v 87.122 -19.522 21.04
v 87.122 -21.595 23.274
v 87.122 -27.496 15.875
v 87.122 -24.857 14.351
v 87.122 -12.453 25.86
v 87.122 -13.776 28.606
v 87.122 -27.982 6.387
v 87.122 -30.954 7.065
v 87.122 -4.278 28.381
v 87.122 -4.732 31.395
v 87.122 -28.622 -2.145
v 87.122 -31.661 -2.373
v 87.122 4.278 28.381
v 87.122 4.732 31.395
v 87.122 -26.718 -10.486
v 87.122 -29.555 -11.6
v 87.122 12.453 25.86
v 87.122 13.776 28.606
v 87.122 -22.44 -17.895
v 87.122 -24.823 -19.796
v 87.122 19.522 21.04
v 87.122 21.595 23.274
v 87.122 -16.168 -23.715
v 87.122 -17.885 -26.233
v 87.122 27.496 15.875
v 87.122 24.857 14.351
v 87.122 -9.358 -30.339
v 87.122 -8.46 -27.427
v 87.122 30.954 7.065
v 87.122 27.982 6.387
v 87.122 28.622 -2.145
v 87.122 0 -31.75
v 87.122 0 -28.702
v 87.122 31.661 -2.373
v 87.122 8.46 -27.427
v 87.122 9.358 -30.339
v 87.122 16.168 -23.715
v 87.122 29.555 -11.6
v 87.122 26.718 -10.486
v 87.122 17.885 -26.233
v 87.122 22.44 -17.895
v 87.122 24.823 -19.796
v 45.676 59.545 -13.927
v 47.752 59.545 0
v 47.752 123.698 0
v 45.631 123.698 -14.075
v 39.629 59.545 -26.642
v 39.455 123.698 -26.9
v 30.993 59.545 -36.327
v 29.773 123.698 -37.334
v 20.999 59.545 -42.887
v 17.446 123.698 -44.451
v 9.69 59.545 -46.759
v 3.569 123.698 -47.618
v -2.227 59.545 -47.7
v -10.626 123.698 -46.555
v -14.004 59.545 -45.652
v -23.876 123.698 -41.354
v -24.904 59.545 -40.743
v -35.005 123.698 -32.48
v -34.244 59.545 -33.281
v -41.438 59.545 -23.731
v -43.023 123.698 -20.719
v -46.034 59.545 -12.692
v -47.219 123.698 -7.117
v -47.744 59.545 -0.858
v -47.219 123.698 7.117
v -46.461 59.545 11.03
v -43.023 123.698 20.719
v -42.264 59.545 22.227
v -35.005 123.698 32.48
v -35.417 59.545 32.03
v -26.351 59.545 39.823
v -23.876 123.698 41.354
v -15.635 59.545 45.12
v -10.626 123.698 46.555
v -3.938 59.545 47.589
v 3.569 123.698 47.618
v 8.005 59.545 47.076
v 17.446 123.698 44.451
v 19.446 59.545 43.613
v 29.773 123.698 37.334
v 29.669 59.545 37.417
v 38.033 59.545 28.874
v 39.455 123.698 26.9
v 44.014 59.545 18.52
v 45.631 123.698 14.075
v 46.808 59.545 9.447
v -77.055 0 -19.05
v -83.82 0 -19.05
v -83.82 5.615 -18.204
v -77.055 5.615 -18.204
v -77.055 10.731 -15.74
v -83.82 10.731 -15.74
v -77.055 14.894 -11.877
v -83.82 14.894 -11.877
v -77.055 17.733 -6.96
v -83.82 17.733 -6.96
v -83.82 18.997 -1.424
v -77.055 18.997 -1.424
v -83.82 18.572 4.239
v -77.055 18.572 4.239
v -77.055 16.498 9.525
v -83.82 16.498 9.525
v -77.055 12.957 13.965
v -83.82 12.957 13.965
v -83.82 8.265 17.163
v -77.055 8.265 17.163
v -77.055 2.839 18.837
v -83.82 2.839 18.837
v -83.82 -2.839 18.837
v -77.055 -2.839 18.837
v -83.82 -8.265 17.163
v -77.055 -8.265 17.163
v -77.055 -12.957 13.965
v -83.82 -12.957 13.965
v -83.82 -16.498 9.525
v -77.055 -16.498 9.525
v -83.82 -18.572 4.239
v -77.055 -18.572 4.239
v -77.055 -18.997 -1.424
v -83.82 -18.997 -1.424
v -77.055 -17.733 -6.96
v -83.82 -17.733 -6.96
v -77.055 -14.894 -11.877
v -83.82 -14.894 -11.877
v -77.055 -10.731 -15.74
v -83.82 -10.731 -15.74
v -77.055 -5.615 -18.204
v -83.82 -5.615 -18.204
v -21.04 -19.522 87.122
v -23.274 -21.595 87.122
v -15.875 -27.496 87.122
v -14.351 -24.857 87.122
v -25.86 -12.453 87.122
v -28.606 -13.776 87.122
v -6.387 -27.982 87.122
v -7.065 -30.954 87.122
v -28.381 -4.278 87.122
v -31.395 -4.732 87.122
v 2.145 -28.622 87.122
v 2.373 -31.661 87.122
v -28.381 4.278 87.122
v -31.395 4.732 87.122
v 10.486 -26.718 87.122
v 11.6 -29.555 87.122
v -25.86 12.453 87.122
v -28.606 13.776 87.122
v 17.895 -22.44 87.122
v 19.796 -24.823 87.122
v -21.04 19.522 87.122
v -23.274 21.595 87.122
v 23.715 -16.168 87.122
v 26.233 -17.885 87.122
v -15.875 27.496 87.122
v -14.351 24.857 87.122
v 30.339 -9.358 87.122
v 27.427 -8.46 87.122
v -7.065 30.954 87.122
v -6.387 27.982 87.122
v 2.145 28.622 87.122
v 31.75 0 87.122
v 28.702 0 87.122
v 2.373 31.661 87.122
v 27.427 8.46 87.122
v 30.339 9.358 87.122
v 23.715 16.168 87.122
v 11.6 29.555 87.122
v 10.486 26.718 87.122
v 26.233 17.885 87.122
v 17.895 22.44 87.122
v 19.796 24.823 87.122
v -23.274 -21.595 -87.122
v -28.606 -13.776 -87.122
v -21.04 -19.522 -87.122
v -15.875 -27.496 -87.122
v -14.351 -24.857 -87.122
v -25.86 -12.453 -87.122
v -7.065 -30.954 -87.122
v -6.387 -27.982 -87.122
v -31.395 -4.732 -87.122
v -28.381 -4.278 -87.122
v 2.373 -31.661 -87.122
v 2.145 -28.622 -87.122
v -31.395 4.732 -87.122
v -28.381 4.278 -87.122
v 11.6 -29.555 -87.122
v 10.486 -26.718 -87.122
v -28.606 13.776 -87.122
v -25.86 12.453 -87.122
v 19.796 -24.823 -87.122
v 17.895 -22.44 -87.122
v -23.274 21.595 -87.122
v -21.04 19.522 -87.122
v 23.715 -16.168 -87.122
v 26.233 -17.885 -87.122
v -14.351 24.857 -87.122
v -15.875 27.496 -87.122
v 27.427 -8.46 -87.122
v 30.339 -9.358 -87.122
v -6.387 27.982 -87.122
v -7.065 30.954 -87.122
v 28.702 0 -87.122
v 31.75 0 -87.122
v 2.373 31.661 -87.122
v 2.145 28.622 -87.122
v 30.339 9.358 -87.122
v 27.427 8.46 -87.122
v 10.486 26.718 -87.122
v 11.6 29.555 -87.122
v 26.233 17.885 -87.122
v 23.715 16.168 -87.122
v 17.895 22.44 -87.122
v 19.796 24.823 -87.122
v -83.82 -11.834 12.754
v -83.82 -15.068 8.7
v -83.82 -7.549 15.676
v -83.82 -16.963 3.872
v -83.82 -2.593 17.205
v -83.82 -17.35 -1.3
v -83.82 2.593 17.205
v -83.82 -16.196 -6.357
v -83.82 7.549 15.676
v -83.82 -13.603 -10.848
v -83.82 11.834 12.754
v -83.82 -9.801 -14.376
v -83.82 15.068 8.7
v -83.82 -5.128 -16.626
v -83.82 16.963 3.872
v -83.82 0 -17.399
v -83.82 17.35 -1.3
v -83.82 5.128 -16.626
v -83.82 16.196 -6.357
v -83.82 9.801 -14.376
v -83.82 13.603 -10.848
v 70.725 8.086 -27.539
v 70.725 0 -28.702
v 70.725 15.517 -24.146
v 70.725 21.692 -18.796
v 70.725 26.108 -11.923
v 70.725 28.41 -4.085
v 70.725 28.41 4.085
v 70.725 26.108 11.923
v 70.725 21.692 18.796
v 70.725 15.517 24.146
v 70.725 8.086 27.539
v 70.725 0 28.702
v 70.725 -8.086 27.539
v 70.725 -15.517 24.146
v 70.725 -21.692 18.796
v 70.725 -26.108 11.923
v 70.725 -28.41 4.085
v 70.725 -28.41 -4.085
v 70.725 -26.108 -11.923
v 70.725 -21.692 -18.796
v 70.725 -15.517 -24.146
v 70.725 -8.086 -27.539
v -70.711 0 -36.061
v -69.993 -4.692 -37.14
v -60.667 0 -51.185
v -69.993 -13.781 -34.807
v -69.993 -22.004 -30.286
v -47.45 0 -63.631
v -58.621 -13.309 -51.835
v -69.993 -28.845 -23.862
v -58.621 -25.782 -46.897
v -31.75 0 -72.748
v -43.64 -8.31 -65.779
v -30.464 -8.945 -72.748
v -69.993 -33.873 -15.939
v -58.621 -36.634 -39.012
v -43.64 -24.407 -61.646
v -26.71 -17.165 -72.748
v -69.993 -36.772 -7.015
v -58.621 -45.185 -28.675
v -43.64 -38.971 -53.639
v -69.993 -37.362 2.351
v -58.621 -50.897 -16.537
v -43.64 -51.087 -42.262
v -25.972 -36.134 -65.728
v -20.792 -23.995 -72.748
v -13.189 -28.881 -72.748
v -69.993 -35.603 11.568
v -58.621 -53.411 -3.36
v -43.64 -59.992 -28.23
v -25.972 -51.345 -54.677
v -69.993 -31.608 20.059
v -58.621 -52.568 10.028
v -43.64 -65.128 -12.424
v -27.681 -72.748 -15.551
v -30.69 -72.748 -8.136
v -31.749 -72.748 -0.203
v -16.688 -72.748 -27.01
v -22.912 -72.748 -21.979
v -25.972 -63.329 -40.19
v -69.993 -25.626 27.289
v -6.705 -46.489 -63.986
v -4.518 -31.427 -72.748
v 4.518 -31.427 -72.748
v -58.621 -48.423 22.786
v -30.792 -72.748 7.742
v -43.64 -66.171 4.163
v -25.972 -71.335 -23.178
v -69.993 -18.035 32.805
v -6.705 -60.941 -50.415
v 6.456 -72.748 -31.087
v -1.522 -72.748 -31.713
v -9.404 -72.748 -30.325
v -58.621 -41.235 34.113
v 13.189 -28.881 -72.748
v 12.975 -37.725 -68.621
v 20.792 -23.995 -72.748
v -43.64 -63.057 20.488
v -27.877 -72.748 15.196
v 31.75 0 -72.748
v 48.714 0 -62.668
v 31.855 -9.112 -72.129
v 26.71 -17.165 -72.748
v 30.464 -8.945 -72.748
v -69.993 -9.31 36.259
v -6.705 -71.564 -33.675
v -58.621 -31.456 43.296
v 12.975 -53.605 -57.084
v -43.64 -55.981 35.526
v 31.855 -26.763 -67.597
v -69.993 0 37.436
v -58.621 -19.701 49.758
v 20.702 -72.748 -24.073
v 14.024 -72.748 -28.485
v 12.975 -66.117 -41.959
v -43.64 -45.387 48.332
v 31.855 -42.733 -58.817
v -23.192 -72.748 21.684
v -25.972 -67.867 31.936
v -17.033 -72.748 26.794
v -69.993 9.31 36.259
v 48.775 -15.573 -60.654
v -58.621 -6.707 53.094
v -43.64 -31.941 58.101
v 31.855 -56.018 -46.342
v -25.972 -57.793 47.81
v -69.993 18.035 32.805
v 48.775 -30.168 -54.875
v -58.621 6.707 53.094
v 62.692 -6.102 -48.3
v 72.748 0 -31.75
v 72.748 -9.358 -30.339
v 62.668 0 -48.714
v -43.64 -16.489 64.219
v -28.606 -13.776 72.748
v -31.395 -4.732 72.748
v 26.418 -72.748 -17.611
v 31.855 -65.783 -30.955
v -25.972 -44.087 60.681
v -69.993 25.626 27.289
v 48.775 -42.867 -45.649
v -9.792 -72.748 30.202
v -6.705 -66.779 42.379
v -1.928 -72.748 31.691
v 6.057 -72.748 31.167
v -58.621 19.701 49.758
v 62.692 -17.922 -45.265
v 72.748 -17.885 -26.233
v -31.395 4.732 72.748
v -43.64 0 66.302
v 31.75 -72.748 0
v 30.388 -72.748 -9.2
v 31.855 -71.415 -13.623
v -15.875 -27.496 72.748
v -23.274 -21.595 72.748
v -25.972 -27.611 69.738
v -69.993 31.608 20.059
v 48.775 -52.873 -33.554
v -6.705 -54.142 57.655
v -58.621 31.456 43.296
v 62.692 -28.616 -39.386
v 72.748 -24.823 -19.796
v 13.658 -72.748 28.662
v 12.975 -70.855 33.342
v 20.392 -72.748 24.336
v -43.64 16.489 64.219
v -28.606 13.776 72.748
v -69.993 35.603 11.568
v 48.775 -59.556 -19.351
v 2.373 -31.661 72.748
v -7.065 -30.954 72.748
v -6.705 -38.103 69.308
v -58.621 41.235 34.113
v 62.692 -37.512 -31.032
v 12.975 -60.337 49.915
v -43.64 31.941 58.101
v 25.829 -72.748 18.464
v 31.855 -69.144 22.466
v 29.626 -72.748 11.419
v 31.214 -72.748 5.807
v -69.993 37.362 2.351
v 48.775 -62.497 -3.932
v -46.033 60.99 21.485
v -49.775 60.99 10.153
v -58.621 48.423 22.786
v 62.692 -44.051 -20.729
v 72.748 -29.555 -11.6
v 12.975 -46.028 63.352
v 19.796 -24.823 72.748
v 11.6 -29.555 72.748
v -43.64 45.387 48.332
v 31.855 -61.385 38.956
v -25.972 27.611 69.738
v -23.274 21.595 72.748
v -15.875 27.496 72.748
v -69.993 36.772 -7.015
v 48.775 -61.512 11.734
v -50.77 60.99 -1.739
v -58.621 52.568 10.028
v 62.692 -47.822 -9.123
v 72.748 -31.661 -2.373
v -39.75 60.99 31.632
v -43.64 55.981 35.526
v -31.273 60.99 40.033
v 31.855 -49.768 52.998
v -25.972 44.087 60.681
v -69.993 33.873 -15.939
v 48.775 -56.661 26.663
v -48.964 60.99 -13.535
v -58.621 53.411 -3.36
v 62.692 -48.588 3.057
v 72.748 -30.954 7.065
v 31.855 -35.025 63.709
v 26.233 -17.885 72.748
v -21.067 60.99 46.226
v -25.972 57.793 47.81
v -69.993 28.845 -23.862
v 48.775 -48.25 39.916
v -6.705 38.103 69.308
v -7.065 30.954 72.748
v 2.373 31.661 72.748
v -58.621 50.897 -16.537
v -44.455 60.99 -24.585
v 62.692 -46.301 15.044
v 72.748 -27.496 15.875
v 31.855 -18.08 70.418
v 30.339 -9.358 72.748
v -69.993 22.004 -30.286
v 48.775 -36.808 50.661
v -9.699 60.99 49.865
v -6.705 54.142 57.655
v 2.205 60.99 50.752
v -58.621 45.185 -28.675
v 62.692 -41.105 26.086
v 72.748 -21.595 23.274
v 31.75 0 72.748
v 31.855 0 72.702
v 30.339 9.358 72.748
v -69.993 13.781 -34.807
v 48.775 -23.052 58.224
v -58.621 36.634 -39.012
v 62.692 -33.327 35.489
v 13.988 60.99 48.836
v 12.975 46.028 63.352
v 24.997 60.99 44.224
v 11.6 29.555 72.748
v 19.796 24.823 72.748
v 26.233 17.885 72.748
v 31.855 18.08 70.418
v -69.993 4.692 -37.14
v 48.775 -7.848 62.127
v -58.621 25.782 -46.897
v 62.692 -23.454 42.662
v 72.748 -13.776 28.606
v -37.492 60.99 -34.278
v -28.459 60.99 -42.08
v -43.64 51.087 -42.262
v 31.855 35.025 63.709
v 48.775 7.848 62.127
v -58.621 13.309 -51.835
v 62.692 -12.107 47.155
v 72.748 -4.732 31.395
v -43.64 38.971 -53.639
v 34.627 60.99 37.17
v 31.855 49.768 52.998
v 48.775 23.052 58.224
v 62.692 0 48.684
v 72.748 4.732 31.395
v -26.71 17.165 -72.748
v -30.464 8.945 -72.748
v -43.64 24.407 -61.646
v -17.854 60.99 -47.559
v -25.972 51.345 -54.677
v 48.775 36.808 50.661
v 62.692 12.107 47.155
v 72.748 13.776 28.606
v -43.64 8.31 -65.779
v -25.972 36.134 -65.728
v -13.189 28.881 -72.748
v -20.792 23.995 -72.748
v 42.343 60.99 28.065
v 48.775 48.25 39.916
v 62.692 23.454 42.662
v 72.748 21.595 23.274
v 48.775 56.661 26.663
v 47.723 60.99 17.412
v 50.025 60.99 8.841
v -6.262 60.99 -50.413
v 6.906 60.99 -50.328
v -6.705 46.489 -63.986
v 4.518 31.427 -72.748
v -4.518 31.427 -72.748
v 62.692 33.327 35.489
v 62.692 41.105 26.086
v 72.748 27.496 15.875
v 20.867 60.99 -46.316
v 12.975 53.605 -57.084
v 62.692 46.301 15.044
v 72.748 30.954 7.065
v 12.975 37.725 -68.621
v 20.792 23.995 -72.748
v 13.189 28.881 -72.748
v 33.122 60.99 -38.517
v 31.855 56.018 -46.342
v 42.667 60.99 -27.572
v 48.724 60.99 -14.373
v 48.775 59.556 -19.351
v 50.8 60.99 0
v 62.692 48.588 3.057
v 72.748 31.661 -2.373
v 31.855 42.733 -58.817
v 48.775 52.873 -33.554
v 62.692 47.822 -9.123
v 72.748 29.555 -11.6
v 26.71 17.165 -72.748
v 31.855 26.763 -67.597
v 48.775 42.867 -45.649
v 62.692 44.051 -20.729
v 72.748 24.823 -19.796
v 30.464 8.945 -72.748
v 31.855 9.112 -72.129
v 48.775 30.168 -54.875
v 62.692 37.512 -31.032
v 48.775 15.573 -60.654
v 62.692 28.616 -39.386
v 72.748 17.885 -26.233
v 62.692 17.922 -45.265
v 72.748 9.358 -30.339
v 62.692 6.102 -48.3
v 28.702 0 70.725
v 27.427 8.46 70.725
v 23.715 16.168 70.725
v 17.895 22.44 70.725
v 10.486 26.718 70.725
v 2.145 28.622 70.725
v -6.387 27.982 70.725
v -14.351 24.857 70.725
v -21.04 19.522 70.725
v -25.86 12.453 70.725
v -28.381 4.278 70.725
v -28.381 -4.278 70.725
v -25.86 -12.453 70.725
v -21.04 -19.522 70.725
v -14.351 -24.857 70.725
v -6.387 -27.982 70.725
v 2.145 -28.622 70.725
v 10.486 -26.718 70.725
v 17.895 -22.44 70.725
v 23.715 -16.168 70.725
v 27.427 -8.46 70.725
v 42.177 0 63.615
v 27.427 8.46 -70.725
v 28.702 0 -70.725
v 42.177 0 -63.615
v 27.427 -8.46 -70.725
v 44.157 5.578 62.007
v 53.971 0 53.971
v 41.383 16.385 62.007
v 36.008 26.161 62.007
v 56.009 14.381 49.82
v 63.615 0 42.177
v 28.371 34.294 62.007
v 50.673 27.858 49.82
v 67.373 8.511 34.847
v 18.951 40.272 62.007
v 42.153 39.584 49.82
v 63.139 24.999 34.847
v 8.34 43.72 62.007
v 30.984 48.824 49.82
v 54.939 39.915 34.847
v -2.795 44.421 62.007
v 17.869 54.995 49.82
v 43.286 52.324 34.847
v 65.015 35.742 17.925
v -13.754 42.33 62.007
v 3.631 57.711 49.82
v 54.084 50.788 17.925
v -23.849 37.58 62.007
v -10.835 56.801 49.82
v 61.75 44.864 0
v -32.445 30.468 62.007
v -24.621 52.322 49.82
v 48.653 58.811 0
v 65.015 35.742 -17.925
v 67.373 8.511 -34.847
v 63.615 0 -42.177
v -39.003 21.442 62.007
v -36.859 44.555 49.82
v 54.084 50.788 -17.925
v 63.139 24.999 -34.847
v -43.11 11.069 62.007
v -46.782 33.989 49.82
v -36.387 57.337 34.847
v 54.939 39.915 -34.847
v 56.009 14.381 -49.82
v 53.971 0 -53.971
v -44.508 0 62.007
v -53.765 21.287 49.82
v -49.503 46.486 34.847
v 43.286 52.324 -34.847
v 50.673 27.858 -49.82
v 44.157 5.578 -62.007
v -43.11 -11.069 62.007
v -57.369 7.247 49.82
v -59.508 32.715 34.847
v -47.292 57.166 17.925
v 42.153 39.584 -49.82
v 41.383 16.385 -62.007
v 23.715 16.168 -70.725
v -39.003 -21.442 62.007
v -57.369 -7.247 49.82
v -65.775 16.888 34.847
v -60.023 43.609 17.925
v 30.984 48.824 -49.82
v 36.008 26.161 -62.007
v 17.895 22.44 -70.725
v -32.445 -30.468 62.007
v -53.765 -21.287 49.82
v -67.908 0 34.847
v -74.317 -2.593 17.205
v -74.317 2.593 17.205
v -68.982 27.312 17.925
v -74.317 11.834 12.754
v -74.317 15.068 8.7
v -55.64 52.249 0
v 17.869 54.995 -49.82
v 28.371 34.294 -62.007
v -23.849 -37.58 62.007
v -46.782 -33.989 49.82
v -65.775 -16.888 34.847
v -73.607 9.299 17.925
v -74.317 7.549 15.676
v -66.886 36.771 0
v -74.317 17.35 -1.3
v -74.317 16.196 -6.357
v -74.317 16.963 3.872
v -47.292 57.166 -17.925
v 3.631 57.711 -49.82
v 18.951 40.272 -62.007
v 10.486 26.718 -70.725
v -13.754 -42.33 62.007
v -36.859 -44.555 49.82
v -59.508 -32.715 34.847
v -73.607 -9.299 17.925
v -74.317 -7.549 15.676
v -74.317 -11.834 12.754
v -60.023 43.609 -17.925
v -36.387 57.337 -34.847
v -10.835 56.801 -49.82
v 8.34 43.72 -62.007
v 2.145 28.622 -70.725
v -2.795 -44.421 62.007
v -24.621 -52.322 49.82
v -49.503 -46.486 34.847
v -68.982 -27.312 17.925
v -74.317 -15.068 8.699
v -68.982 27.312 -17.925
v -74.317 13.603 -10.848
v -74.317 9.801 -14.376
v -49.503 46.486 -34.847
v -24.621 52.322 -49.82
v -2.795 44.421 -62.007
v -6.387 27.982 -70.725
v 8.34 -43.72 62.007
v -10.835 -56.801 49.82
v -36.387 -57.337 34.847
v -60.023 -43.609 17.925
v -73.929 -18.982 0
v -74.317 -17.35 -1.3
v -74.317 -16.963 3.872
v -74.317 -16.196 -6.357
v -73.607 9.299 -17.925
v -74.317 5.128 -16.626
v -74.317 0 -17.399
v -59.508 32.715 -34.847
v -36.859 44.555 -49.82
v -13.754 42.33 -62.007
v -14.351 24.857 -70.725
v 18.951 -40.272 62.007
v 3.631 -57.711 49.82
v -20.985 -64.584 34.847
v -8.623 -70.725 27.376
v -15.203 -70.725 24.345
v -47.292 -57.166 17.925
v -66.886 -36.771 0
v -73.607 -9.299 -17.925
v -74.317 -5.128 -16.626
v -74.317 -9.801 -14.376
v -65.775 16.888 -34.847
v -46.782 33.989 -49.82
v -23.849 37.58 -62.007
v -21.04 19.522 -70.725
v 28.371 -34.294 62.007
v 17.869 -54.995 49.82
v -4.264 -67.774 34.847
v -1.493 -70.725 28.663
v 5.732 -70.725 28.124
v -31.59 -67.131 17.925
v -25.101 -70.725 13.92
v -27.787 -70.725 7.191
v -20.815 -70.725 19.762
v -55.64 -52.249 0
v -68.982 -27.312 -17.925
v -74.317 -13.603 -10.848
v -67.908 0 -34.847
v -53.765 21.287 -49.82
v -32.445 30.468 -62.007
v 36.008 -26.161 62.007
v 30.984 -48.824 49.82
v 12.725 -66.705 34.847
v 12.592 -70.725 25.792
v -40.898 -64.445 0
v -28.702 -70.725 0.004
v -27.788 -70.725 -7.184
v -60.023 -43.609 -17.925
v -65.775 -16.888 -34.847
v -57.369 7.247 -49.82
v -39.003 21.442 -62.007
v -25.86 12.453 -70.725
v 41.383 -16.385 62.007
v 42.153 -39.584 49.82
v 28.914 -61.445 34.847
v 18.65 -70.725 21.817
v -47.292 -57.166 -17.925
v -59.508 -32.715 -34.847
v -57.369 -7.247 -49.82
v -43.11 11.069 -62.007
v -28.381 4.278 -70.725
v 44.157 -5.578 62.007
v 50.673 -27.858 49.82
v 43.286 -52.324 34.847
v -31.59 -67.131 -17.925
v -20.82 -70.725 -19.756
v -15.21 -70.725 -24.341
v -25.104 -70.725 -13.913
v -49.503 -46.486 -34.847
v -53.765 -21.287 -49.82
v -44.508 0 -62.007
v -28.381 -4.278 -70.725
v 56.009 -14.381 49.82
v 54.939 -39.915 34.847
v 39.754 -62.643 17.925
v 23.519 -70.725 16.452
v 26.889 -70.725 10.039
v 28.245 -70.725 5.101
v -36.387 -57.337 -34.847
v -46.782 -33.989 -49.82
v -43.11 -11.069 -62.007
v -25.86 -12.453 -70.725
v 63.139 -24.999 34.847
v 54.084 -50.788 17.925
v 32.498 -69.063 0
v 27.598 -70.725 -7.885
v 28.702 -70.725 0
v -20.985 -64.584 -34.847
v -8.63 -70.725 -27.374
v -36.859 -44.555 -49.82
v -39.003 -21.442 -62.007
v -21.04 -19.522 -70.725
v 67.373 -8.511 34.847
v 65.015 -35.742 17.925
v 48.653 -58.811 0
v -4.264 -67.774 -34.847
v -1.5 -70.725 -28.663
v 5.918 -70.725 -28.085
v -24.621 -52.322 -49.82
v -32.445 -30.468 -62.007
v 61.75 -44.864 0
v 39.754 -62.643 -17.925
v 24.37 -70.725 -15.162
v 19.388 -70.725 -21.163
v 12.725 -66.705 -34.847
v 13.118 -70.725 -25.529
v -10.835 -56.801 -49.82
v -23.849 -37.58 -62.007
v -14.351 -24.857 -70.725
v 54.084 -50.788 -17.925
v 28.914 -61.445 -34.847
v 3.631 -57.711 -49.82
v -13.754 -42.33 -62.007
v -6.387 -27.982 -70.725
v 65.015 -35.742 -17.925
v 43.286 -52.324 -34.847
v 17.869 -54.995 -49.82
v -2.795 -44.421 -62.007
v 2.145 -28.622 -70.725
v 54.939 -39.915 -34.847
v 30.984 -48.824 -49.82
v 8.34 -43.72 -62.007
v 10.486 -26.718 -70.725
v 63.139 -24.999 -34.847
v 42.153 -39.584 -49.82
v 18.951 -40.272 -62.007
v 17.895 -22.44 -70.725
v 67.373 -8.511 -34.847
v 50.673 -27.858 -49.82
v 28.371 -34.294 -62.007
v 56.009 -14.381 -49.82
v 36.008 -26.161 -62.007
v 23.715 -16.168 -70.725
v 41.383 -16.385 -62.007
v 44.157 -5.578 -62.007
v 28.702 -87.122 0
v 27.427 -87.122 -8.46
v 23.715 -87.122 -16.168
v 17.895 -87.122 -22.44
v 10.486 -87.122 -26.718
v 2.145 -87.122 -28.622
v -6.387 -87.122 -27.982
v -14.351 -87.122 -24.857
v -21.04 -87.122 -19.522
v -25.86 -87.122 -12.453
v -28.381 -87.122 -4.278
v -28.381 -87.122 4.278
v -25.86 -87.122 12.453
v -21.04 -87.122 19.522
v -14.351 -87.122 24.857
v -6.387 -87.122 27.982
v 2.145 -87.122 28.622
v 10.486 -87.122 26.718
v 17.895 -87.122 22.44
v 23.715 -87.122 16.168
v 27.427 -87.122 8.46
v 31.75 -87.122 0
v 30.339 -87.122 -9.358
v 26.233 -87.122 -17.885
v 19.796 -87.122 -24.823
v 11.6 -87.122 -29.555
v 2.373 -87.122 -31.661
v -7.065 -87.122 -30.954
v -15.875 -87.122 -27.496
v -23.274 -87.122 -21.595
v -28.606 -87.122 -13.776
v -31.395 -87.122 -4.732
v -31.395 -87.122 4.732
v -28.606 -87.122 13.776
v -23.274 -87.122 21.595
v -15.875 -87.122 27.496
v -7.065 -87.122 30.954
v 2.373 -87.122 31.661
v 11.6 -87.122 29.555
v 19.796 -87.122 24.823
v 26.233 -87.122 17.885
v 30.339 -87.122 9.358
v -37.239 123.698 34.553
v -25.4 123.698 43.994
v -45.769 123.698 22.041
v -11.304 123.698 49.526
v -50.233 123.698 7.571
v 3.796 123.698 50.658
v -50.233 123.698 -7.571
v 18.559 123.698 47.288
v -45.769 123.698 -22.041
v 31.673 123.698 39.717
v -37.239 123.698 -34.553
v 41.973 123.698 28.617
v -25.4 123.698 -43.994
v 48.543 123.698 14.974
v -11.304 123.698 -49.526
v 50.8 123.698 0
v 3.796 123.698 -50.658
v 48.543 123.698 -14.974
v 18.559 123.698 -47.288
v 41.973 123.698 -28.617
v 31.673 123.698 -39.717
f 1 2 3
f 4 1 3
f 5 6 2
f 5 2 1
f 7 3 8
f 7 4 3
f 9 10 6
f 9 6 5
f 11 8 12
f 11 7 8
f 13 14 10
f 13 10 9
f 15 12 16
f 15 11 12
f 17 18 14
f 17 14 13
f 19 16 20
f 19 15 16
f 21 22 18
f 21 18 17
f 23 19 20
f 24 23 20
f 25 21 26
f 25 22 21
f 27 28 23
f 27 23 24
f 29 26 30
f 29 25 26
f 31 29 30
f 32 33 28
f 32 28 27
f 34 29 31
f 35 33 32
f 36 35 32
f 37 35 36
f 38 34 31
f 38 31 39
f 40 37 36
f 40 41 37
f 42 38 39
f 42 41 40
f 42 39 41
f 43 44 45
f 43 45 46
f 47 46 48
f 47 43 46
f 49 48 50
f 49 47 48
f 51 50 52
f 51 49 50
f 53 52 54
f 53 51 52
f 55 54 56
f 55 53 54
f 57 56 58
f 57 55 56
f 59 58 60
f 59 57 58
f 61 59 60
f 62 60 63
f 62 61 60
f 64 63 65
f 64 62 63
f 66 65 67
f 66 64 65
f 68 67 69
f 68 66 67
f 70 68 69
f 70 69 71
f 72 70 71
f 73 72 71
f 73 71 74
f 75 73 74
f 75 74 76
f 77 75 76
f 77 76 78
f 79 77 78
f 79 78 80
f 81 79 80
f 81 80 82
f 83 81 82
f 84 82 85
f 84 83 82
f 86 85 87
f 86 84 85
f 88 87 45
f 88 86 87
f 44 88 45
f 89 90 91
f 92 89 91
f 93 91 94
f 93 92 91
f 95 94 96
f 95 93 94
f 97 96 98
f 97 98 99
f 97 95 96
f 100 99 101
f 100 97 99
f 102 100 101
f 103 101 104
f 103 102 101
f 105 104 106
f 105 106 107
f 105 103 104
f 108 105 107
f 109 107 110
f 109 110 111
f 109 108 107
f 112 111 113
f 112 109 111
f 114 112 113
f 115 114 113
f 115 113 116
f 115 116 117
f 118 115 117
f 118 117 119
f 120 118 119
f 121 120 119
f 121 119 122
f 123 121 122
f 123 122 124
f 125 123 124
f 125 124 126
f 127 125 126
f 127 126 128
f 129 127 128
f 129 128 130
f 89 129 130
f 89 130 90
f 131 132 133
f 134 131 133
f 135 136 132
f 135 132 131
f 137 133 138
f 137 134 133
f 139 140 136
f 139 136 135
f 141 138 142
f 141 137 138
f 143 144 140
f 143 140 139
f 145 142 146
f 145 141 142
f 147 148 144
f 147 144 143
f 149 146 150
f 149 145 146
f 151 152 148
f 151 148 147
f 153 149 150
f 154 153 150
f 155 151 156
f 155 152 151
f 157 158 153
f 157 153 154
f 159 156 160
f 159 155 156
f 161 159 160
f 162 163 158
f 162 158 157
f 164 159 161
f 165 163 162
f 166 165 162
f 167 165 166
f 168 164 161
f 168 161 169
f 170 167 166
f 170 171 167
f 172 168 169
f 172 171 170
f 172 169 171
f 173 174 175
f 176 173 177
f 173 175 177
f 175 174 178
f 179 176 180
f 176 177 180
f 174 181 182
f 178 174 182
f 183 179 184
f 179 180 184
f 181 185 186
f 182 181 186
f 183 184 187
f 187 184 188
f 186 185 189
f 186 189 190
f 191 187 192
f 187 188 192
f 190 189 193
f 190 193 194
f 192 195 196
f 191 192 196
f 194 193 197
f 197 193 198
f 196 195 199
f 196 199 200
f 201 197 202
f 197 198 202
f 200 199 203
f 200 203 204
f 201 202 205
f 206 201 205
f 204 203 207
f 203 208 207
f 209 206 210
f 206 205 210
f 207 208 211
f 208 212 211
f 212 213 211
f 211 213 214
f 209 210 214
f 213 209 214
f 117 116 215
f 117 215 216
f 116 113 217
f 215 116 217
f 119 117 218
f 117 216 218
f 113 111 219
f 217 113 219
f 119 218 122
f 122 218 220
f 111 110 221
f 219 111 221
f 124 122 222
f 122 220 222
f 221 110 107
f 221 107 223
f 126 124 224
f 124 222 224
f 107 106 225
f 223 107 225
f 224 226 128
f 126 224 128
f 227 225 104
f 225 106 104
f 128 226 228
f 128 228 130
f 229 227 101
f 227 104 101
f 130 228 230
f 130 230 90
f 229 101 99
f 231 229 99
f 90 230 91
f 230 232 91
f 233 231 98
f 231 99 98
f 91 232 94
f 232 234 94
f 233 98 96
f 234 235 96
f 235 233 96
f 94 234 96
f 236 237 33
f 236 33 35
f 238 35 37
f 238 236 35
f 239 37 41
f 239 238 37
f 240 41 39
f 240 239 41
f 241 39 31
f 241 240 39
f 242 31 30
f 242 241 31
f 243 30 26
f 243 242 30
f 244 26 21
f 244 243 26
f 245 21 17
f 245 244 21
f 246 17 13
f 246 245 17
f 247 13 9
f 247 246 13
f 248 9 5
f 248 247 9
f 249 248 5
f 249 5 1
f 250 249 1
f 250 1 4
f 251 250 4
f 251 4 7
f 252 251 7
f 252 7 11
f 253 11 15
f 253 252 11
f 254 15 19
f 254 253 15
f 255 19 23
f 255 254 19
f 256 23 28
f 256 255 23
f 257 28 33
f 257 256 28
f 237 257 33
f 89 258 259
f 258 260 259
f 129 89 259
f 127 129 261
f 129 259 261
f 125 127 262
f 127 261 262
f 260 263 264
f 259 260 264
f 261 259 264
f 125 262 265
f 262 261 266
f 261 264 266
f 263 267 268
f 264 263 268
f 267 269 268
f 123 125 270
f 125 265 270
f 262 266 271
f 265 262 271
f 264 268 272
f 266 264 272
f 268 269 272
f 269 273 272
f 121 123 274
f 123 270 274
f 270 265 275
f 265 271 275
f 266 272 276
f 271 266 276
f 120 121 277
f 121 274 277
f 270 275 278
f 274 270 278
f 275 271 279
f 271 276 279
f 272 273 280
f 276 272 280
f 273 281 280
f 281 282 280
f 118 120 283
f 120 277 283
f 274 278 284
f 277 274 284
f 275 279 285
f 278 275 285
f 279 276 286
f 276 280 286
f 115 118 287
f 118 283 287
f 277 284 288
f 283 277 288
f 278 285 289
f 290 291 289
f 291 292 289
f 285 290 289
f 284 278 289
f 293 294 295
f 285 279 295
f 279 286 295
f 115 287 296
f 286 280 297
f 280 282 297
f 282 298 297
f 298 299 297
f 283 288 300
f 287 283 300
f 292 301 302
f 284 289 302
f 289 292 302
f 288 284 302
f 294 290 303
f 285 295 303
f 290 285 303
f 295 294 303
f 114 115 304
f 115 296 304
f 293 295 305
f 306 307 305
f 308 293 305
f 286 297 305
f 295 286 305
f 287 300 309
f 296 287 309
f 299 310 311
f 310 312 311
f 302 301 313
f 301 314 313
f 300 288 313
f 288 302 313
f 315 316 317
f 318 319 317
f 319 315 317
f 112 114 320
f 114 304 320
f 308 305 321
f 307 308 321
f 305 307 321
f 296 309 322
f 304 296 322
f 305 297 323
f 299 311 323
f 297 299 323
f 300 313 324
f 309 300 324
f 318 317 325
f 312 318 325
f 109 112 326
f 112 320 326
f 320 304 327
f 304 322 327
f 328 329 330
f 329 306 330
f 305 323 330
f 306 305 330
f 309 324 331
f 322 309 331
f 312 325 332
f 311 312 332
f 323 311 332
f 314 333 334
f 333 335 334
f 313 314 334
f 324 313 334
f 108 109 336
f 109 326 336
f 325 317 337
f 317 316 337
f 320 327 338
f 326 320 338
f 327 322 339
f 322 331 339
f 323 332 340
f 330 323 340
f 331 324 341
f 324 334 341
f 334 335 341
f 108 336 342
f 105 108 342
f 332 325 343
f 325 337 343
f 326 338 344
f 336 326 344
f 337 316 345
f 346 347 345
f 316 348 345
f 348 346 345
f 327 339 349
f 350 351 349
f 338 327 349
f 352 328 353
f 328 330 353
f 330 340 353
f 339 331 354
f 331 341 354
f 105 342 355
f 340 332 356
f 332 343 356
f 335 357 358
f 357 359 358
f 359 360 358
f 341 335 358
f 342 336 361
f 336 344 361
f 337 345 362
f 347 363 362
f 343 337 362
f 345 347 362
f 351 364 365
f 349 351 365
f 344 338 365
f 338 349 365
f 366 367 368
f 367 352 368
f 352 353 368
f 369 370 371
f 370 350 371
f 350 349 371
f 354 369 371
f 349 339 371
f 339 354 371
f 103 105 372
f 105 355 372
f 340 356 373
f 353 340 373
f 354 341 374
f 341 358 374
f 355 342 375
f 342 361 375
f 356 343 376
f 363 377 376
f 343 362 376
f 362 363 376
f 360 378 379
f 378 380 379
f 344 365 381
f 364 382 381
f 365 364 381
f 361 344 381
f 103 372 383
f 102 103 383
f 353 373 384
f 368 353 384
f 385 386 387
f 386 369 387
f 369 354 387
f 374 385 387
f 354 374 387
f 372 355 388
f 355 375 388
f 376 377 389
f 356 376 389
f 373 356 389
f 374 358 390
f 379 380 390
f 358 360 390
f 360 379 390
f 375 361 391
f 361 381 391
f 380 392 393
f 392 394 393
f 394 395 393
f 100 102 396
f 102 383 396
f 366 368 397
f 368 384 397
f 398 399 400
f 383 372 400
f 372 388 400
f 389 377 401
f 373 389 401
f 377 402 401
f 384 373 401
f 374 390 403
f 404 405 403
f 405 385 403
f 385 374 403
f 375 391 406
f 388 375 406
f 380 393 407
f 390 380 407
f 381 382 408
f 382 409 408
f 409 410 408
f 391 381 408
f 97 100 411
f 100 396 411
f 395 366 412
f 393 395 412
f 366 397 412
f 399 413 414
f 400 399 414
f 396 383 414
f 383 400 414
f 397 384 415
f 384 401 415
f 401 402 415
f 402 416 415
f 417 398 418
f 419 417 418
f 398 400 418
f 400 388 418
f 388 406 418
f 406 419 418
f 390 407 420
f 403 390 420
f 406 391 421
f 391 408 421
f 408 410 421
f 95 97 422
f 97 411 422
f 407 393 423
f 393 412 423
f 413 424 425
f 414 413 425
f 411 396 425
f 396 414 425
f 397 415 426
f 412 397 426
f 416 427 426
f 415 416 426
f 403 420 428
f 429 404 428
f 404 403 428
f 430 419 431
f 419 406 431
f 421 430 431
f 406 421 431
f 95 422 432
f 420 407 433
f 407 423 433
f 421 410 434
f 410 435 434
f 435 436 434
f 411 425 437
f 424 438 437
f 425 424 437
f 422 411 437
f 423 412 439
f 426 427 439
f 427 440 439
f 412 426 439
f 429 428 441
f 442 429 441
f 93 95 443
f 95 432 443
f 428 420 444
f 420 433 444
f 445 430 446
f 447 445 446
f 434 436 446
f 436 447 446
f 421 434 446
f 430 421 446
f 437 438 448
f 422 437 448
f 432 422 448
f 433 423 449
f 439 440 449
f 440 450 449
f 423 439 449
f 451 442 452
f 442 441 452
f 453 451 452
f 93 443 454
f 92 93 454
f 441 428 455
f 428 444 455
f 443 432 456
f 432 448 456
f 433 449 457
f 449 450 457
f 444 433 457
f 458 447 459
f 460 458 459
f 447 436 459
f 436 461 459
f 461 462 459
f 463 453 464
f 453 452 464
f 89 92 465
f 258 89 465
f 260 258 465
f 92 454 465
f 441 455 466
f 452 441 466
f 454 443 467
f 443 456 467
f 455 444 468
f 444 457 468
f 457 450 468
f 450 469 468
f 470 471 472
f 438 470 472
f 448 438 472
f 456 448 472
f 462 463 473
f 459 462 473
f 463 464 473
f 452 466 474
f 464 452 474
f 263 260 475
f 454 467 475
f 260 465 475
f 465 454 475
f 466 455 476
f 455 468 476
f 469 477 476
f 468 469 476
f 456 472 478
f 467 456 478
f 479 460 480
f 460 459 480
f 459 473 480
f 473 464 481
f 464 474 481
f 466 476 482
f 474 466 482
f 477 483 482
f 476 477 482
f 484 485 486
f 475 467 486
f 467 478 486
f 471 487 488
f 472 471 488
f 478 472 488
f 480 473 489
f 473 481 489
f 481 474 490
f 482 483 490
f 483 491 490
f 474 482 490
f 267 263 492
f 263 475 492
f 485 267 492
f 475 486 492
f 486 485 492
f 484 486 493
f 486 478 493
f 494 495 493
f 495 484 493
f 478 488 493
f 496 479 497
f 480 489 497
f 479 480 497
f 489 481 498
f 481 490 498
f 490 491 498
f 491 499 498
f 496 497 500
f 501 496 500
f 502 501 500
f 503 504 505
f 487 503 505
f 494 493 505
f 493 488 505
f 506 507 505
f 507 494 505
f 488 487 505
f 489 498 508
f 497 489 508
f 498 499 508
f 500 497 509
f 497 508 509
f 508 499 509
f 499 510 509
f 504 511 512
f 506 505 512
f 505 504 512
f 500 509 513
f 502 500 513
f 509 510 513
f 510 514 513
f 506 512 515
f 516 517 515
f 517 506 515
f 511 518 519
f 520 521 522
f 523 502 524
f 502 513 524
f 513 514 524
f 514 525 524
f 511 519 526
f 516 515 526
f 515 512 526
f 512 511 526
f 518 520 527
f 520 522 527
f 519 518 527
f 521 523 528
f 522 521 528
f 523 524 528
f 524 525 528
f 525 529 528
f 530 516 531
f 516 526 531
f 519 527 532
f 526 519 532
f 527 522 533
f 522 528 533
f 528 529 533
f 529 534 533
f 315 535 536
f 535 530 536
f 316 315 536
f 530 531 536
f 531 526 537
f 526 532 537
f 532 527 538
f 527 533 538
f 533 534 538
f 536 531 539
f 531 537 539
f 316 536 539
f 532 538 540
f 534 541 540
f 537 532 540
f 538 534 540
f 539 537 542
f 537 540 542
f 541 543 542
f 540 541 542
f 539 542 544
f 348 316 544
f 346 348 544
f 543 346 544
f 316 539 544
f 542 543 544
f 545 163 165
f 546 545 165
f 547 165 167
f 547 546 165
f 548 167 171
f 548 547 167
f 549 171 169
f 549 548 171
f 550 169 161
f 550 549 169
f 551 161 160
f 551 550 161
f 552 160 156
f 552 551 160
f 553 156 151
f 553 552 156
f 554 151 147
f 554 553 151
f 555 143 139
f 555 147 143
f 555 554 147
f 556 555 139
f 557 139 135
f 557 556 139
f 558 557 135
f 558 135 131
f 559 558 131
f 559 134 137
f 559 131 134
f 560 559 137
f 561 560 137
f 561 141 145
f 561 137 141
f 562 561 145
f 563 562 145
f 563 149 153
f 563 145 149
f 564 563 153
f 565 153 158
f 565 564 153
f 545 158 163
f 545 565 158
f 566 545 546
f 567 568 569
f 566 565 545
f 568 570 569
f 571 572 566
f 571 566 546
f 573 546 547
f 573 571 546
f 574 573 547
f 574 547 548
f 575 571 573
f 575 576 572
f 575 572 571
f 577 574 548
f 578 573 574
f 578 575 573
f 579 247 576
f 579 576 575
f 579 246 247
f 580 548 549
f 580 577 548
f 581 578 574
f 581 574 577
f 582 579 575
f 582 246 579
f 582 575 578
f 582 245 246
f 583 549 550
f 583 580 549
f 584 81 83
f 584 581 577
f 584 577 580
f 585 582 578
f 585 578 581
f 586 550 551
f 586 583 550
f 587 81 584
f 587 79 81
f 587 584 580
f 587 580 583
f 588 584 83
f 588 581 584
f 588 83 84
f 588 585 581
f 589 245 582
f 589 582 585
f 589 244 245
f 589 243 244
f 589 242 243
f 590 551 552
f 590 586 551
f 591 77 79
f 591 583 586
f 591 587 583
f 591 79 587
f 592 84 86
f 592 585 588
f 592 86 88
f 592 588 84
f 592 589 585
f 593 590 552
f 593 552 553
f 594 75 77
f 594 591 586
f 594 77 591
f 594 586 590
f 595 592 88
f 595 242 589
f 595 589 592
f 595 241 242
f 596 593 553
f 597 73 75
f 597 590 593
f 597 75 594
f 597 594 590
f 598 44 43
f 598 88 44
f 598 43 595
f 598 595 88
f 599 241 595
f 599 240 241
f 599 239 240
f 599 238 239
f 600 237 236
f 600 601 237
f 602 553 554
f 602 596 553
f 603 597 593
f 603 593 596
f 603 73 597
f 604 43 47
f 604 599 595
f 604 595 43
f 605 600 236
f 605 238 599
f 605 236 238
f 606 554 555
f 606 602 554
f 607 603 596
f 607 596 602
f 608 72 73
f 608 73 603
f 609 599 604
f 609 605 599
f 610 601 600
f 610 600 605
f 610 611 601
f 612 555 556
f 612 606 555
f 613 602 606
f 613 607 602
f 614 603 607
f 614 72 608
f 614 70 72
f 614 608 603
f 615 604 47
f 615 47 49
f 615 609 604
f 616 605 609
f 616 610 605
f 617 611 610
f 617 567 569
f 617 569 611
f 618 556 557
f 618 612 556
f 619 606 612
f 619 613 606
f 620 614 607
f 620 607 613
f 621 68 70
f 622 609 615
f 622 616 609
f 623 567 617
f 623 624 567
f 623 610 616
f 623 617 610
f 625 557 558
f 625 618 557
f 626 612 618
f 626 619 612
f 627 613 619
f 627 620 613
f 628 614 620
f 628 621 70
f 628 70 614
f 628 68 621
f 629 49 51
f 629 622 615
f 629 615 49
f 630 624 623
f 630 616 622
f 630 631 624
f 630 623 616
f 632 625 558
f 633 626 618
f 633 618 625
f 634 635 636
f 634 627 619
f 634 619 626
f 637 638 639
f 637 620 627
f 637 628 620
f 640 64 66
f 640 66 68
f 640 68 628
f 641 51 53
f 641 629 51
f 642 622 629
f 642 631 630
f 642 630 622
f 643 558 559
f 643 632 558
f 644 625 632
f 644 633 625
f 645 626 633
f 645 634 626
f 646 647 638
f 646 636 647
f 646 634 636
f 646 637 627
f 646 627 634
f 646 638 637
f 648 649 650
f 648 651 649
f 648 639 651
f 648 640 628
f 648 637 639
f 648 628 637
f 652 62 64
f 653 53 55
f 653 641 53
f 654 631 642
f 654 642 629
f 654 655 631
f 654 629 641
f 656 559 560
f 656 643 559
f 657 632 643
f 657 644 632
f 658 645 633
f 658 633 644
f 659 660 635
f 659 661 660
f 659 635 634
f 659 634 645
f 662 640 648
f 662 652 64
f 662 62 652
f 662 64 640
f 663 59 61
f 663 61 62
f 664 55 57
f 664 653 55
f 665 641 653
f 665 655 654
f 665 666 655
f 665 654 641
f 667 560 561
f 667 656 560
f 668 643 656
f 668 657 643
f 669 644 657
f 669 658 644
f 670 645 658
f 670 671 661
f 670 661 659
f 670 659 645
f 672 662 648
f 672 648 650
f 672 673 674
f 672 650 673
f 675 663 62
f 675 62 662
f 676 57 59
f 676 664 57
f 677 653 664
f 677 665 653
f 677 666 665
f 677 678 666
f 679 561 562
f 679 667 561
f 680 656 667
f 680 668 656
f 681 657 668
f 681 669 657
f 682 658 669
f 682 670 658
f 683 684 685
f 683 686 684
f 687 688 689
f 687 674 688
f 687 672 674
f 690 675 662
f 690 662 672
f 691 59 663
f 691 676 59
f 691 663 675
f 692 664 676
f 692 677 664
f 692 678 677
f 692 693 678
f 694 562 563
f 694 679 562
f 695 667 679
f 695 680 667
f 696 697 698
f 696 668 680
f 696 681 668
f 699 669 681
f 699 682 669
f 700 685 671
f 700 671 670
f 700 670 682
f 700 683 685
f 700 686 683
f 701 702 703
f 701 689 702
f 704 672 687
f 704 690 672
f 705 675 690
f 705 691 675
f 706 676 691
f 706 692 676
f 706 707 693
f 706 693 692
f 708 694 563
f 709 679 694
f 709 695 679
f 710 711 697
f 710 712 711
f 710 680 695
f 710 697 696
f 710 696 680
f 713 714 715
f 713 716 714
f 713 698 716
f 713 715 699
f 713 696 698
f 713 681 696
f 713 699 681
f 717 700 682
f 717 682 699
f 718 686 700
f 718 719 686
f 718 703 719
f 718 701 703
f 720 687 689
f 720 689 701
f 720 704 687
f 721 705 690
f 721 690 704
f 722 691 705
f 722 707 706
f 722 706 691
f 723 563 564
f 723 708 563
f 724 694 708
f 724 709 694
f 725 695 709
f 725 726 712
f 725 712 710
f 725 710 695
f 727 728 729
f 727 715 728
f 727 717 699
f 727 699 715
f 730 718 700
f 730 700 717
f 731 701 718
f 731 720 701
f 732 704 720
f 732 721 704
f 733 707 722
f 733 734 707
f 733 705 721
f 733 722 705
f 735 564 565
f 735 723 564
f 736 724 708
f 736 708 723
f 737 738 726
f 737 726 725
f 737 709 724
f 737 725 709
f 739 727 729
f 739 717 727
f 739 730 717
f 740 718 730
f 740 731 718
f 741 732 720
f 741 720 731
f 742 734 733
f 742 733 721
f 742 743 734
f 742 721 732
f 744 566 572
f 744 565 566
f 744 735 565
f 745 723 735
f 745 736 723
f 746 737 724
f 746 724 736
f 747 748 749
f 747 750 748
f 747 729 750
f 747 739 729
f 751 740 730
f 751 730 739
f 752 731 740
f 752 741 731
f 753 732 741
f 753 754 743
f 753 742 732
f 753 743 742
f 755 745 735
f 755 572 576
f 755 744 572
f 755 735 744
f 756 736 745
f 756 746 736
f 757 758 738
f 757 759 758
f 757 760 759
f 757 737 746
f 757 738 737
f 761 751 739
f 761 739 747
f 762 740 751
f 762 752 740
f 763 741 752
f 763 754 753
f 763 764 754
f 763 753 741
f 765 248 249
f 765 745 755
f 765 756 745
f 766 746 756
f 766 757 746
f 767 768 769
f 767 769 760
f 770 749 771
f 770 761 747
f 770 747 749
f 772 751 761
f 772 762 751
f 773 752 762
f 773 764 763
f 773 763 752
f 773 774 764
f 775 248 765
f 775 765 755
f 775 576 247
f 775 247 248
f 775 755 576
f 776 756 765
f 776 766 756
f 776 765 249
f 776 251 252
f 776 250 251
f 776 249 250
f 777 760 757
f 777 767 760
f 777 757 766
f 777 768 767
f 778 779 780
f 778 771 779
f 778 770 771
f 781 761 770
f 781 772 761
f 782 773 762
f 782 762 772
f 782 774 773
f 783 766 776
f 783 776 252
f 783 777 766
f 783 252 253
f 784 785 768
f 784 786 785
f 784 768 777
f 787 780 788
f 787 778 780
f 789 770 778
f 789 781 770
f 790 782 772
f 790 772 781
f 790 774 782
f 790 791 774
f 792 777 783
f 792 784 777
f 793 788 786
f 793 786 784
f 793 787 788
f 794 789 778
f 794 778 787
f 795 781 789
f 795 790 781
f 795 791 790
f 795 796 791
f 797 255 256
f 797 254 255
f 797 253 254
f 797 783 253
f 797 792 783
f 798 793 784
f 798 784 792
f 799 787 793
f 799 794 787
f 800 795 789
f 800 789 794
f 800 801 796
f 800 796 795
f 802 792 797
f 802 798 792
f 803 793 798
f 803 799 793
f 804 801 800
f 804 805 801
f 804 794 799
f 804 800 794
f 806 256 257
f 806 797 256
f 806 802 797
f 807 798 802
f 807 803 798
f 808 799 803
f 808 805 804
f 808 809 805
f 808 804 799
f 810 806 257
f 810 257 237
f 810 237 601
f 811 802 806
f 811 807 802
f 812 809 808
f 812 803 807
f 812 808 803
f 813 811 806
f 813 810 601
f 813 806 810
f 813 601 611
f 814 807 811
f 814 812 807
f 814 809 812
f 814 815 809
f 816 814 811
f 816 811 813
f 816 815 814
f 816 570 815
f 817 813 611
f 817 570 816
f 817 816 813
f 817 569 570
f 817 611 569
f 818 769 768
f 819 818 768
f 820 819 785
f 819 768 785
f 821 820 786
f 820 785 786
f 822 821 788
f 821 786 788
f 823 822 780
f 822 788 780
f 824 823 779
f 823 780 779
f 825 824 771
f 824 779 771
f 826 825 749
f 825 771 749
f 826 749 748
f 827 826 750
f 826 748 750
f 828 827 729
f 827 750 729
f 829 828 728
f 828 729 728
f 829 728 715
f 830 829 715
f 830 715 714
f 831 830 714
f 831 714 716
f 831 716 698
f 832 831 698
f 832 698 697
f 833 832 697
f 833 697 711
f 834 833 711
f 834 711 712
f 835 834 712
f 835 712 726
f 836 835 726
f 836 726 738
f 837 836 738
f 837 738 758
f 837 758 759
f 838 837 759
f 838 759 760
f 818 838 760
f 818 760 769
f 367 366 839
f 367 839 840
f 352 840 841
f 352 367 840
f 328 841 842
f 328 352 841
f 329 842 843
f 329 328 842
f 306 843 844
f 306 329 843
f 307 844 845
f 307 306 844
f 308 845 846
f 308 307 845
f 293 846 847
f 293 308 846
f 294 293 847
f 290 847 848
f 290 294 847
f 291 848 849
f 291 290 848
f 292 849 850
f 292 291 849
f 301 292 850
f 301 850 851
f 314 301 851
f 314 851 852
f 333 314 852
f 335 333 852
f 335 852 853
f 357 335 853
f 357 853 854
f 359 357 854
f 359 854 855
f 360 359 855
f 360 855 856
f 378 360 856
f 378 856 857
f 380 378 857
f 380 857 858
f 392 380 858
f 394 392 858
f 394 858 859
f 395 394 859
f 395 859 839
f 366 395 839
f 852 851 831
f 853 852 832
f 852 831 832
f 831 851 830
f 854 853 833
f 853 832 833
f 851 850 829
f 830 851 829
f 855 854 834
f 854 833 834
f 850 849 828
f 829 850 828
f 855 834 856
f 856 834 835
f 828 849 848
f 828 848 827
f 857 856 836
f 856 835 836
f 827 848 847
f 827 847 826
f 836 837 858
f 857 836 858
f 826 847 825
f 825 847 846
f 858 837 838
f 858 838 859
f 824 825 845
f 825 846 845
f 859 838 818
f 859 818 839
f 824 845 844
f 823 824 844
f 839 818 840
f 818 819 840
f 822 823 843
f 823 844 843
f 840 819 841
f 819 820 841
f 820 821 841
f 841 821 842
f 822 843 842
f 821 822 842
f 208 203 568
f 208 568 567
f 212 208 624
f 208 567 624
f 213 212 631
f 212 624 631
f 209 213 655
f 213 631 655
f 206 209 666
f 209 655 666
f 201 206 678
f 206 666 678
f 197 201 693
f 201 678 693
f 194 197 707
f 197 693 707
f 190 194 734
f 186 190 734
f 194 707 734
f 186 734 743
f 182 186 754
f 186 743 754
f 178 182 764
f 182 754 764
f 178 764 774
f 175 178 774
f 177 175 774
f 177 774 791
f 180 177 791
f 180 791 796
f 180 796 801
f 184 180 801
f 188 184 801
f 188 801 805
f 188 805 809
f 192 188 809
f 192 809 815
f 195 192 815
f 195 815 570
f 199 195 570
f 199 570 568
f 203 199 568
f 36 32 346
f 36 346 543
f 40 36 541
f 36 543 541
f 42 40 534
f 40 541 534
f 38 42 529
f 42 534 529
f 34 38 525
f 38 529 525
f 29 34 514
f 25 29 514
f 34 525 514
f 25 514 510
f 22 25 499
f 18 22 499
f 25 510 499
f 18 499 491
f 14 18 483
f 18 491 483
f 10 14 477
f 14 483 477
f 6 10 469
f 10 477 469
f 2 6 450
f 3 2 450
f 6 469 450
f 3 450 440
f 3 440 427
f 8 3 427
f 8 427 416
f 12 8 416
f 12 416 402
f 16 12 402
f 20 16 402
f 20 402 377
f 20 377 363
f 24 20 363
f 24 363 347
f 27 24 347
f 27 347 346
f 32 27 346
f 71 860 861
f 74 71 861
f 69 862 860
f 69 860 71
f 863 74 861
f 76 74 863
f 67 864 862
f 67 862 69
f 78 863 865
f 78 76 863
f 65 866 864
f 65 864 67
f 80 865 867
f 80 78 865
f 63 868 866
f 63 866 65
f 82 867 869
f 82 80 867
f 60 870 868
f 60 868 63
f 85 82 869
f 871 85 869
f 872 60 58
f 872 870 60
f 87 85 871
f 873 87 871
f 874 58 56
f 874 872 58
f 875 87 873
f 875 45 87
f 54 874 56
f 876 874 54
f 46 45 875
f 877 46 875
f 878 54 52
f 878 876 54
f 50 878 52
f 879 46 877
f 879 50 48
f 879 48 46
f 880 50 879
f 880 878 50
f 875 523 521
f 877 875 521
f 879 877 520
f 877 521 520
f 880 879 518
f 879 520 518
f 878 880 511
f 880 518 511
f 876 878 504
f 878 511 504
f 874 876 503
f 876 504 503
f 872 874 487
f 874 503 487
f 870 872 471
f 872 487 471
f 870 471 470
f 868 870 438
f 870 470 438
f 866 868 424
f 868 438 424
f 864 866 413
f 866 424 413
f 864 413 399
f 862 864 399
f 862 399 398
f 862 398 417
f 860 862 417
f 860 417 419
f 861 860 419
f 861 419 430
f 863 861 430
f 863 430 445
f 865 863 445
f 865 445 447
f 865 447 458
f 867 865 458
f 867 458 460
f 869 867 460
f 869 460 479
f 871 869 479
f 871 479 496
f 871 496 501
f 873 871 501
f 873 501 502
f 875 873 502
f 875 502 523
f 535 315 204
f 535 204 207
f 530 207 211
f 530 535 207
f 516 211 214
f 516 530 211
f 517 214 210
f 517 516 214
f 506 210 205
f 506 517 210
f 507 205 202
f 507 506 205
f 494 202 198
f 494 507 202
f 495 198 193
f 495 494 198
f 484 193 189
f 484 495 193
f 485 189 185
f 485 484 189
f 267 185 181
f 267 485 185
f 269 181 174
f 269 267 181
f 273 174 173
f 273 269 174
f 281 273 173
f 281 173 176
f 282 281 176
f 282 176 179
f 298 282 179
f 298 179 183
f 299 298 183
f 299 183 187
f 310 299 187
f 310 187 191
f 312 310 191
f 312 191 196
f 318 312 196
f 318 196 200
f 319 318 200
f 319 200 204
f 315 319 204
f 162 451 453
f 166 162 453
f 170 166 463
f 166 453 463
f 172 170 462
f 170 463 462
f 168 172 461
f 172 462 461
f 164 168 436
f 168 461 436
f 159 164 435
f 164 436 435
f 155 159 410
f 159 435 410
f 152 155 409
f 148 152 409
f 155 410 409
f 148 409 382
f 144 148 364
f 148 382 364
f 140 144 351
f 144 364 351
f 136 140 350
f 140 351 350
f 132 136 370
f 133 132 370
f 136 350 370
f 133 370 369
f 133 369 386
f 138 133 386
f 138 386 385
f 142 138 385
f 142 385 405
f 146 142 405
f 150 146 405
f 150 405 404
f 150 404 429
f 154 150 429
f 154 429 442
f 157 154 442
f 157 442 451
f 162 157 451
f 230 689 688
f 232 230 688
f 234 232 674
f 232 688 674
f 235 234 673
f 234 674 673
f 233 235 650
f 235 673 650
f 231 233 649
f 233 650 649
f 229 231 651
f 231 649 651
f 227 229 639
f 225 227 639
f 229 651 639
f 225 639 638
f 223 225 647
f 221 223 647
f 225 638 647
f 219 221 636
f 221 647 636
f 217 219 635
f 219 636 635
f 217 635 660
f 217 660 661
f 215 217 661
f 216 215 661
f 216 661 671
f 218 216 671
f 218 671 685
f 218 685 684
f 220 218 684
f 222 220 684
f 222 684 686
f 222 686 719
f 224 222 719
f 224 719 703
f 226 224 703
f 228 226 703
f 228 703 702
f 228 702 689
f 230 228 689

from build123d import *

# Parameters (mm, degrees)
SKETCH1_R                = 50.8
BOSS_EXTRUDE1_DEPTH      = 123.698
SKETCH31_R               = 31.75
BOSS_EXTRUDE6_DEPTH      = 87.122
SKETCH7_R                = 31.75
BOSS_EXTRUDE3_DEPTH      = 87.122
BOSS_EXTRUDE3_DEPTH_BACK = 87.122
SKETCH9_R                = 31.75
BOSS_EXTRUDE4_DEPTH      = 87.122
SKETCH11_R               = 19.05
BOSS_EXTRUDE5_DEPTH      = 83.82
SKETCH12_R               = 47.752
CUT_EXTRUDE4_DEPTH       = 124.6980001
SKETCH32_R               = 28.702
CUT_EXTRUDE8_DEPTH       = 88.1220001
SKETCH13_R               = 28.702
CUT_EXTRUDE5_DEPTH       = 88.122
CUT_EXTRUDE5_DEPTH_BACK  = 88.122
SKETCH14_R               = 28.702
CUT_EXTRUDE6_DEPTH       = 88.122
SKETCH15_R               = 17.399
CUT_EXTRUDE7_DEPTH       = 84.82


with BuildPart() as part:
    # Sketch1 → Boss-Extrude1 (new body)
    with BuildSketch(Plane(origin=(0, 0, 0), x_dir=(1, 0, 0), z_dir=(0, 1, 0))):
        Circle(SKETCH1_R)
    extrude(amount=BOSS_EXTRUDE1_DEPTH)

    # Sketch31 → Boss-Extrude6 (add)
    with BuildSketch(Plane(origin=(0, 0, 0), x_dir=(1, 0, 0), z_dir=(0, 1, 0))):
        Circle(SKETCH31_R)
    extrude(amount=-BOSS_EXTRUDE6_DEPTH)

    # Sketch7 → Boss-Extrude3 (add, two sides)
    with BuildSketch(Plane.XY) as boss_extrude3_sk:
        Circle(SKETCH7_R)
    extrude(amount=BOSS_EXTRUDE3_DEPTH)
    extrude(boss_extrude3_sk.sketch, amount=-BOSS_EXTRUDE3_DEPTH_BACK)

    # Sketch9 → Boss-Extrude4 (add)
    with BuildSketch(Plane(origin=(0, 0, 0), x_dir=(0, 0, -1), z_dir=(1, 0, 0))):
        Circle(SKETCH9_R)
    extrude(amount=BOSS_EXTRUDE4_DEPTH)

    # Sketch11 → Boss-Extrude5 (add)
    with BuildSketch(Plane(origin=(0, 0, 0), x_dir=(0, 0, -1), z_dir=(1, 0, 0))):
        Circle(SKETCH11_R)
    extrude(amount=-BOSS_EXTRUDE5_DEPTH)

    # Sketch23 → Revolve-Thin2 (revolve)
    with BuildSketch(Plane(origin=(0, 0, 0), x_dir=(1, 0, 0), z_dir=(0, 1, 0))):
        with BuildLine():
            ThreePointArc((-79.375, 0), (0, 79.375), (79.375, 0))
            Line((79.375, 0), (69.375, 0))
            ThreePointArc((69.375, 0), (0, 69.375), (-69.375, 0))
            Line((-69.375, 0), (-79.375, 0))
        make_face()
    revolve(axis=Axis((79.375, 0, 0), (-1, 0, 0)))

    # Sketch12 → Cut-Extrude4 (cut, through all)
    with BuildSketch(Plane(origin=(0, 0, 0), x_dir=(1, 0, 0), z_dir=(0, 1, 0))):
        Circle(SKETCH12_R)
    extrude(amount=CUT_EXTRUDE4_DEPTH, mode=Mode.SUBTRACT)

    # Sketch32 → Cut-Extrude8 (cut, through all)
    with BuildSketch(Plane(origin=(0, 0, 0), x_dir=(1, 0, 0), z_dir=(0, 1, 0))):
        Circle(SKETCH32_R)
    extrude(amount=-CUT_EXTRUDE8_DEPTH, mode=Mode.SUBTRACT)

    # Sketch13 → Cut-Extrude5 (cut, two sides)
    with BuildSketch(Plane.XY) as cut_extrude5_sk:
        Circle(SKETCH13_R)
    extrude(amount=CUT_EXTRUDE5_DEPTH, mode=Mode.SUBTRACT)
    extrude(cut_extrude5_sk.sketch, amount=-CUT_EXTRUDE5_DEPTH_BACK, mode=Mode.SUBTRACT)

    # Sketch14 → Cut-Extrude6 (cut, through all)
    with BuildSketch(Plane(origin=(0, 0, 0), x_dir=(0, 0, -1), z_dir=(1, 0, 0))):
        Circle(SKETCH14_R)
    extrude(amount=CUT_EXTRUDE6_DEPTH, mode=Mode.SUBTRACT)

    # Sketch15 → Cut-Extrude7 (cut, through all)
    with BuildSketch(Plane(origin=(0, 0, 0), x_dir=(0, 0, -1), z_dir=(1, 0, 0))):
        Circle(SKETCH15_R)
    extrude(amount=-CUT_EXTRUDE7_DEPTH, mode=Mode.SUBTRACT)

    # Sketch26 → Cut-Revolve1 (revolve, cut)
    with BuildSketch(Plane(origin=(0, 0, 0), x_dir=(1, 0, 0), z_dir=(0, 1, 0))):
        with BuildLine():
            Line((0, 76.327), (0, -76.327))
            ThreePointArc((0, -76.327), (76.327, 0), (0, 76.327))
        make_face()
    revolve(axis=Axis((0, 0, -76.327), (0, 0, 1)), mode=Mode.SUBTRACT)


solid = part.part
